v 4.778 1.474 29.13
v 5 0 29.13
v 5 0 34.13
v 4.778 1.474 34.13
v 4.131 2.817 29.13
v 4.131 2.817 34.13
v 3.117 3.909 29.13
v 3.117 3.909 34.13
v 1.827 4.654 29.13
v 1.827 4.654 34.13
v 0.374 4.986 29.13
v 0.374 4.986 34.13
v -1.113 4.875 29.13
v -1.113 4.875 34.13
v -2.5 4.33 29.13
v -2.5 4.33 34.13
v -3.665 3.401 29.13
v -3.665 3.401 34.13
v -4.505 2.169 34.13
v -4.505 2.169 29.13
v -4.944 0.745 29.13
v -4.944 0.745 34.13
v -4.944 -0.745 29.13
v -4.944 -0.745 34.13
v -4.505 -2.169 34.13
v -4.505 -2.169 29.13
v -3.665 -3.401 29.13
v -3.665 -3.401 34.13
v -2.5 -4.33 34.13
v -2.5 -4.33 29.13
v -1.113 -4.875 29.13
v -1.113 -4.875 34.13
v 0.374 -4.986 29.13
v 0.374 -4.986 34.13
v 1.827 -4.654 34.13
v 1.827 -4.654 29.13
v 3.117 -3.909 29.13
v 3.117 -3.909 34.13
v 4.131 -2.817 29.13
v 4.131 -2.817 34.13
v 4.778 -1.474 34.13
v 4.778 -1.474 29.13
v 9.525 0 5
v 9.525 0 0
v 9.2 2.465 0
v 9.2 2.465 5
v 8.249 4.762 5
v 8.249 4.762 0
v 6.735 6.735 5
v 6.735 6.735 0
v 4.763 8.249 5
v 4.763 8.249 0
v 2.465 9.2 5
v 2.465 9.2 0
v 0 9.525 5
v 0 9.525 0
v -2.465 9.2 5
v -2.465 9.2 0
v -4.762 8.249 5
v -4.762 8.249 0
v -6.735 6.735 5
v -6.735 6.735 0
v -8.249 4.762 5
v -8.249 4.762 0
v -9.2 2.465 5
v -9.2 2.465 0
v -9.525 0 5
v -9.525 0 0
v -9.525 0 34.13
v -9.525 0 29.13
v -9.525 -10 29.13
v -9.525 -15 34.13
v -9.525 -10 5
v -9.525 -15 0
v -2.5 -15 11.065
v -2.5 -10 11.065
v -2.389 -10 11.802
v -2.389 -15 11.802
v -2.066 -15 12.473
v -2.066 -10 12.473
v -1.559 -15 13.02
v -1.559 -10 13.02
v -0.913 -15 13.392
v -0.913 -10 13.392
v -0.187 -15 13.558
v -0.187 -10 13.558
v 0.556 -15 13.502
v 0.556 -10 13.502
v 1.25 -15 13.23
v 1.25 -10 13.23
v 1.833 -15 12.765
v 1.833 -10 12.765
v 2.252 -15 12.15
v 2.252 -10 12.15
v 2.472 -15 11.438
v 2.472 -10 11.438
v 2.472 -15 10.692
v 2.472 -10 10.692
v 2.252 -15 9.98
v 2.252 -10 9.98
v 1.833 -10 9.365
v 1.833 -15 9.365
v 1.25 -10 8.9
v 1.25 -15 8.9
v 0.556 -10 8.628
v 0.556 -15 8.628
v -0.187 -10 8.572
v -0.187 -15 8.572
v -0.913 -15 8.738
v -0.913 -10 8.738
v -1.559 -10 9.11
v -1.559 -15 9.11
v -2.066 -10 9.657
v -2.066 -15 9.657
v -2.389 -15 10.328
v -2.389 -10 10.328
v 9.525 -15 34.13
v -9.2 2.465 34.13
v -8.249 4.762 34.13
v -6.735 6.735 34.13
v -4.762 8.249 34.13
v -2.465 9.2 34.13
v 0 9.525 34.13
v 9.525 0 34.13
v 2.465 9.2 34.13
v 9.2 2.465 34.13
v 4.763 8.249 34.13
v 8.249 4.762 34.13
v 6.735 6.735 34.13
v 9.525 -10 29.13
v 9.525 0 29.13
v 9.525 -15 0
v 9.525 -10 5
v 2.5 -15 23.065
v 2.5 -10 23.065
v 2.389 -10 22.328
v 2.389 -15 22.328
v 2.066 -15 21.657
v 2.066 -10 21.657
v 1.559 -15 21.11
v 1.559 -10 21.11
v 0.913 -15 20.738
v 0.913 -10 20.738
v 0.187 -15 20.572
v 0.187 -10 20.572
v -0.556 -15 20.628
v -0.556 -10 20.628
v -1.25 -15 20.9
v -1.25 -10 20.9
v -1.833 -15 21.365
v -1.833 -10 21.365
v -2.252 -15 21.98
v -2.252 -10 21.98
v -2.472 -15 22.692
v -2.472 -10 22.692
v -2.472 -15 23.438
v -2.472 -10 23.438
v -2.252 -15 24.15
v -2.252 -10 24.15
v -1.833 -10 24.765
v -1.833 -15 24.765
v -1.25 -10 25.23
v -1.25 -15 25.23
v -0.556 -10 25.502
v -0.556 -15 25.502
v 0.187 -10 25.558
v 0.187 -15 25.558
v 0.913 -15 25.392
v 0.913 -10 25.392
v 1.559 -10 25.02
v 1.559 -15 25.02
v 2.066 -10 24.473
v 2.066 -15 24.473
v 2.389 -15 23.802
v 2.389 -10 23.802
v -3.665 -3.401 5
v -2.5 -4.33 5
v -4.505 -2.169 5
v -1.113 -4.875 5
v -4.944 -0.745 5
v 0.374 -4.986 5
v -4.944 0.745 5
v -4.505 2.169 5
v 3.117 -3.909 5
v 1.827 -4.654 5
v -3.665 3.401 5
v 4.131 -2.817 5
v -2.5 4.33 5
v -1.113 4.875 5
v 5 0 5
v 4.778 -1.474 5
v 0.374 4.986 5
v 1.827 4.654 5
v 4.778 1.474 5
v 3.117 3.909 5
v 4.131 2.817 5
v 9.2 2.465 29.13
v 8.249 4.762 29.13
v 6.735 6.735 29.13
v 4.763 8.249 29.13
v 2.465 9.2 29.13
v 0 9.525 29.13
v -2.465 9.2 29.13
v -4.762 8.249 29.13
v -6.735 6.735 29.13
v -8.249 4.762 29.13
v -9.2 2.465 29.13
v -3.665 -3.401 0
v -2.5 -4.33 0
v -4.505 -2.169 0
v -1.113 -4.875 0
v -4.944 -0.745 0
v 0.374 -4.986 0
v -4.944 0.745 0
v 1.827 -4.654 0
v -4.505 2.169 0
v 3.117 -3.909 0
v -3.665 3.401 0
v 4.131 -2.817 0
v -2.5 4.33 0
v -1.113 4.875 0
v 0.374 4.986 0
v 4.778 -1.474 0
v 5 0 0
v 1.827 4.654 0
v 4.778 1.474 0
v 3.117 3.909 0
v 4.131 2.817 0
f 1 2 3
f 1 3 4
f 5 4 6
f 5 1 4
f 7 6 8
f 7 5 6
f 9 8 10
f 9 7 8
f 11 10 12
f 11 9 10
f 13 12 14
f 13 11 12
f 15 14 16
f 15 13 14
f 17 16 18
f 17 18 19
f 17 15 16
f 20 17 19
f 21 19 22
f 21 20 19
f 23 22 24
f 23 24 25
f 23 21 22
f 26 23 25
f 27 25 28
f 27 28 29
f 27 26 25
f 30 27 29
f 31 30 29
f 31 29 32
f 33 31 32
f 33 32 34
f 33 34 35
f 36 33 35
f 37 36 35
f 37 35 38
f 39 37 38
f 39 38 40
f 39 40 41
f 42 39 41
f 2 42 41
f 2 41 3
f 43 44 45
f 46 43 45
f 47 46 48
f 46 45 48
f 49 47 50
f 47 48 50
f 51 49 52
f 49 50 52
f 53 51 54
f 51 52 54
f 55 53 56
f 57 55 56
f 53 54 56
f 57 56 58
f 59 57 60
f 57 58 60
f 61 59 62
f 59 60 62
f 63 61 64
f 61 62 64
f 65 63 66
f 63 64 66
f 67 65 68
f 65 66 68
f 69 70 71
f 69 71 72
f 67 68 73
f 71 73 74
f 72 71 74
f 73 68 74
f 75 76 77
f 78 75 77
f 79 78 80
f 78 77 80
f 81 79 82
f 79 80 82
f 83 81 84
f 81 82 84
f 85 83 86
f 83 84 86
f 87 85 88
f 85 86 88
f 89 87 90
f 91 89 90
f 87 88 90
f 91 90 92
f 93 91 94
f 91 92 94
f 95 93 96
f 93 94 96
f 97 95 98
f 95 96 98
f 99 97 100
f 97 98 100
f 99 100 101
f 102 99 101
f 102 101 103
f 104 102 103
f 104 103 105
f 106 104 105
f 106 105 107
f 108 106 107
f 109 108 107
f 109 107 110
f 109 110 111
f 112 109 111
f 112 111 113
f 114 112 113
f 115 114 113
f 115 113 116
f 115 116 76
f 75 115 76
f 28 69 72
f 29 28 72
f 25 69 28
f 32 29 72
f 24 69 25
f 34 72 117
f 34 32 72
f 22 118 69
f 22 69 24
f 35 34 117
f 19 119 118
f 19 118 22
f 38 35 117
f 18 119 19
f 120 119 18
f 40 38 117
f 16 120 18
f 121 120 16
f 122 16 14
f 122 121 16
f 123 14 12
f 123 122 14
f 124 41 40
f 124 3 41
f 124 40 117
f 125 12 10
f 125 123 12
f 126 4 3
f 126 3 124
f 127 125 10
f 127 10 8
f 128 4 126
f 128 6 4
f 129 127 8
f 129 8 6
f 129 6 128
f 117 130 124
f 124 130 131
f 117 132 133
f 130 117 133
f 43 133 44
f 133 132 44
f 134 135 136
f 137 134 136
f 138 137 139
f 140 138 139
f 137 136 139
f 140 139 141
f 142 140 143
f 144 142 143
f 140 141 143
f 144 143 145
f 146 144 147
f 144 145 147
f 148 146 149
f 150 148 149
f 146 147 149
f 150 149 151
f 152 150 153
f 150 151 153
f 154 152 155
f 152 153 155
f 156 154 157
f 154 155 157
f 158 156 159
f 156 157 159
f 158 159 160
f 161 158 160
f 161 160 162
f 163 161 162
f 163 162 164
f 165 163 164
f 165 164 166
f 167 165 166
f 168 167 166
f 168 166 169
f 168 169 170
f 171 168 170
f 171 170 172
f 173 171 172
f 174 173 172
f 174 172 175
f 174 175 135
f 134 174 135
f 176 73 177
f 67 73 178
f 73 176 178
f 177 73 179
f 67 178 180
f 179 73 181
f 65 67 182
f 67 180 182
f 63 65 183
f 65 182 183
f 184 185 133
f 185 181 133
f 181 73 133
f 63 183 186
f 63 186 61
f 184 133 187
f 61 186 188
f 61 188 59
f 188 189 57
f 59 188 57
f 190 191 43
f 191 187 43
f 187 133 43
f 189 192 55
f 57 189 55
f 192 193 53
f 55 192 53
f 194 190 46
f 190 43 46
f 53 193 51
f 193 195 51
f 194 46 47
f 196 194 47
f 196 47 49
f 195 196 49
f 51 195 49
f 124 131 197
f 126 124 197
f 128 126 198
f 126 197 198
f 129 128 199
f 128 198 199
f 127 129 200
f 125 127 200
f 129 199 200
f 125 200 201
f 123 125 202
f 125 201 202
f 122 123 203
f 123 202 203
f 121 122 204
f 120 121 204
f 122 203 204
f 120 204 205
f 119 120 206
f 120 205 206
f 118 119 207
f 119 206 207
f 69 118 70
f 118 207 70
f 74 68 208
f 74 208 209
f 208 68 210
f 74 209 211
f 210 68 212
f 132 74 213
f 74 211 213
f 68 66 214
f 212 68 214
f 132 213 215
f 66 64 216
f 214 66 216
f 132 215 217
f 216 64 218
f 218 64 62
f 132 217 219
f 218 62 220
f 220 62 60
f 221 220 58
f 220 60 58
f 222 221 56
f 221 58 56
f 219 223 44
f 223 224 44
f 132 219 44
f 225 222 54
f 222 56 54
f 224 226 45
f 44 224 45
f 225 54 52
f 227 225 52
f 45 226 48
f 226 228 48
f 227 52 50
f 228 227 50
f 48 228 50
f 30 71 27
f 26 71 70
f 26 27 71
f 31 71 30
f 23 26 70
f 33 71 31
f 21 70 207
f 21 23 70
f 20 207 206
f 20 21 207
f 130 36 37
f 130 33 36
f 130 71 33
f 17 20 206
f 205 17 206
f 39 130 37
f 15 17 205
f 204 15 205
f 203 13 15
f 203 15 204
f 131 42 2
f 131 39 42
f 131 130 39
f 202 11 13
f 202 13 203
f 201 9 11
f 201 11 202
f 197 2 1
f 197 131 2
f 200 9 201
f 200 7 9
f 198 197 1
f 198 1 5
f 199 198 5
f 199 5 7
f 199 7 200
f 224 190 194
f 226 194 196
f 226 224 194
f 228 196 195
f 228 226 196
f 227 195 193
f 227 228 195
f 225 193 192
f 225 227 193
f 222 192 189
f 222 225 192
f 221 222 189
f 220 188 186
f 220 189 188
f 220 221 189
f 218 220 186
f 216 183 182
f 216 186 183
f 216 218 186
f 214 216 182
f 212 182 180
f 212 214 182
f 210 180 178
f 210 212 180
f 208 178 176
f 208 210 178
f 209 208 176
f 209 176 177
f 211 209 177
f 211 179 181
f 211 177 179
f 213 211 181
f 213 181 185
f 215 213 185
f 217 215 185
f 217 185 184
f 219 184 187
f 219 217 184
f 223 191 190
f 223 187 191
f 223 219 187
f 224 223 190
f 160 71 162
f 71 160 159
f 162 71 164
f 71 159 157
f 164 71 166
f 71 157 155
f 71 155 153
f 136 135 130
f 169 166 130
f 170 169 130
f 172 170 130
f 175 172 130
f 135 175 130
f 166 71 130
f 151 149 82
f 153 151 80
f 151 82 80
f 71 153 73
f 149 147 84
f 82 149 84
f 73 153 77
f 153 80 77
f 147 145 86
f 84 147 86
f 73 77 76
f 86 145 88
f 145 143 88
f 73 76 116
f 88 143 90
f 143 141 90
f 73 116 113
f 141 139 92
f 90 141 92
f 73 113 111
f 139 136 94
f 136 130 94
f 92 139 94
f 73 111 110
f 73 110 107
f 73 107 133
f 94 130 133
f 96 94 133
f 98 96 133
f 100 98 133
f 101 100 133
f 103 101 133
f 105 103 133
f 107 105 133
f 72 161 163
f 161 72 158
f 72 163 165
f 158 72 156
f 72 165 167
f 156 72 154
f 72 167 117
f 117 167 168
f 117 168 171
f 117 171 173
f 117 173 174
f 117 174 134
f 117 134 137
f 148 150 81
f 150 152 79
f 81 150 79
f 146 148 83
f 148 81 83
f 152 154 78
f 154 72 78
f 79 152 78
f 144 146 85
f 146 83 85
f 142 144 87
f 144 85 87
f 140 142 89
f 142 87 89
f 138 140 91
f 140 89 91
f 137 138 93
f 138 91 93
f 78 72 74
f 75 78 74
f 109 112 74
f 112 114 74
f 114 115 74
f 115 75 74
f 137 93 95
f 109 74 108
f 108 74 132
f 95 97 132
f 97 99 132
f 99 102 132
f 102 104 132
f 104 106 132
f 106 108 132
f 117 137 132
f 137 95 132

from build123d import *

# Parameters (mm, degrees)
SKETCH1_R           = 9.525
SKETCH1_R_2         = 5
BOSS_EXTRUDE1_DEPTH = 34.13
SKETCH2_W           = 24.13
SKETCH2_H           = 19.525
CUT_EXTRUDE1_DEPTH  = 42.865969474
SKETCH3_R           = 2.5
CUT_EXTRUDE2_DEPTH  = 41.45748571


with BuildPart() as part:
    # Sketch1 → Boss-Extrude1 (new body)
    # profile 1 of 2: a face of its own
    with BuildSketch(Plane.XY):
        Circle(SKETCH1_R)
        Circle(SKETCH1_R_2, mode=Mode.SUBTRACT)
    # profile 2 of 2: a face of its own
    with BuildSketch(Plane.XY):
        with BuildLine():
            ThreePointArc((9.525, 0), (0, -9.525), (-9.525, 0))
            Line((-9.525, 0), (-9.525, -15))
            Line((-9.525, -15), (9.525, -15))
            Line((9.525, -15), (9.525, 0))
        make_face()
    extrude(amount=BOSS_EXTRUDE1_DEPTH)

    # Sketch2 → Cut-Extrude1 (cut, through all)
    with BuildSketch(Plane(origin=(9.525, 0, 0), x_dir=(0, 0, -1), z_dir=(1, 0, 0))):
        with Locations((-17.065, -0.2375)):
            Rectangle(SKETCH2_W, SKETCH2_H)
    extrude(amount=-CUT_EXTRUDE1_DEPTH, mode=Mode.SUBTRACT)

    # Sketch3 → Cut-Extrude2 (cut, through all)
    with BuildSketch(Plane(origin=(0, -10, 0), x_dir=(1, 0, 0), z_dir=(0, 1, 0))):
        with Locations(Location((0, -11.065, 0), (0, 0, 180))):
            Circle(SKETCH3_R)
        with Locations((0, -23.065)):
            Circle(SKETCH3_R)
    extrude(amount=-CUT_EXTRUDE2_DEPTH, mode=Mode.SUBTRACT)


solid = part.part
